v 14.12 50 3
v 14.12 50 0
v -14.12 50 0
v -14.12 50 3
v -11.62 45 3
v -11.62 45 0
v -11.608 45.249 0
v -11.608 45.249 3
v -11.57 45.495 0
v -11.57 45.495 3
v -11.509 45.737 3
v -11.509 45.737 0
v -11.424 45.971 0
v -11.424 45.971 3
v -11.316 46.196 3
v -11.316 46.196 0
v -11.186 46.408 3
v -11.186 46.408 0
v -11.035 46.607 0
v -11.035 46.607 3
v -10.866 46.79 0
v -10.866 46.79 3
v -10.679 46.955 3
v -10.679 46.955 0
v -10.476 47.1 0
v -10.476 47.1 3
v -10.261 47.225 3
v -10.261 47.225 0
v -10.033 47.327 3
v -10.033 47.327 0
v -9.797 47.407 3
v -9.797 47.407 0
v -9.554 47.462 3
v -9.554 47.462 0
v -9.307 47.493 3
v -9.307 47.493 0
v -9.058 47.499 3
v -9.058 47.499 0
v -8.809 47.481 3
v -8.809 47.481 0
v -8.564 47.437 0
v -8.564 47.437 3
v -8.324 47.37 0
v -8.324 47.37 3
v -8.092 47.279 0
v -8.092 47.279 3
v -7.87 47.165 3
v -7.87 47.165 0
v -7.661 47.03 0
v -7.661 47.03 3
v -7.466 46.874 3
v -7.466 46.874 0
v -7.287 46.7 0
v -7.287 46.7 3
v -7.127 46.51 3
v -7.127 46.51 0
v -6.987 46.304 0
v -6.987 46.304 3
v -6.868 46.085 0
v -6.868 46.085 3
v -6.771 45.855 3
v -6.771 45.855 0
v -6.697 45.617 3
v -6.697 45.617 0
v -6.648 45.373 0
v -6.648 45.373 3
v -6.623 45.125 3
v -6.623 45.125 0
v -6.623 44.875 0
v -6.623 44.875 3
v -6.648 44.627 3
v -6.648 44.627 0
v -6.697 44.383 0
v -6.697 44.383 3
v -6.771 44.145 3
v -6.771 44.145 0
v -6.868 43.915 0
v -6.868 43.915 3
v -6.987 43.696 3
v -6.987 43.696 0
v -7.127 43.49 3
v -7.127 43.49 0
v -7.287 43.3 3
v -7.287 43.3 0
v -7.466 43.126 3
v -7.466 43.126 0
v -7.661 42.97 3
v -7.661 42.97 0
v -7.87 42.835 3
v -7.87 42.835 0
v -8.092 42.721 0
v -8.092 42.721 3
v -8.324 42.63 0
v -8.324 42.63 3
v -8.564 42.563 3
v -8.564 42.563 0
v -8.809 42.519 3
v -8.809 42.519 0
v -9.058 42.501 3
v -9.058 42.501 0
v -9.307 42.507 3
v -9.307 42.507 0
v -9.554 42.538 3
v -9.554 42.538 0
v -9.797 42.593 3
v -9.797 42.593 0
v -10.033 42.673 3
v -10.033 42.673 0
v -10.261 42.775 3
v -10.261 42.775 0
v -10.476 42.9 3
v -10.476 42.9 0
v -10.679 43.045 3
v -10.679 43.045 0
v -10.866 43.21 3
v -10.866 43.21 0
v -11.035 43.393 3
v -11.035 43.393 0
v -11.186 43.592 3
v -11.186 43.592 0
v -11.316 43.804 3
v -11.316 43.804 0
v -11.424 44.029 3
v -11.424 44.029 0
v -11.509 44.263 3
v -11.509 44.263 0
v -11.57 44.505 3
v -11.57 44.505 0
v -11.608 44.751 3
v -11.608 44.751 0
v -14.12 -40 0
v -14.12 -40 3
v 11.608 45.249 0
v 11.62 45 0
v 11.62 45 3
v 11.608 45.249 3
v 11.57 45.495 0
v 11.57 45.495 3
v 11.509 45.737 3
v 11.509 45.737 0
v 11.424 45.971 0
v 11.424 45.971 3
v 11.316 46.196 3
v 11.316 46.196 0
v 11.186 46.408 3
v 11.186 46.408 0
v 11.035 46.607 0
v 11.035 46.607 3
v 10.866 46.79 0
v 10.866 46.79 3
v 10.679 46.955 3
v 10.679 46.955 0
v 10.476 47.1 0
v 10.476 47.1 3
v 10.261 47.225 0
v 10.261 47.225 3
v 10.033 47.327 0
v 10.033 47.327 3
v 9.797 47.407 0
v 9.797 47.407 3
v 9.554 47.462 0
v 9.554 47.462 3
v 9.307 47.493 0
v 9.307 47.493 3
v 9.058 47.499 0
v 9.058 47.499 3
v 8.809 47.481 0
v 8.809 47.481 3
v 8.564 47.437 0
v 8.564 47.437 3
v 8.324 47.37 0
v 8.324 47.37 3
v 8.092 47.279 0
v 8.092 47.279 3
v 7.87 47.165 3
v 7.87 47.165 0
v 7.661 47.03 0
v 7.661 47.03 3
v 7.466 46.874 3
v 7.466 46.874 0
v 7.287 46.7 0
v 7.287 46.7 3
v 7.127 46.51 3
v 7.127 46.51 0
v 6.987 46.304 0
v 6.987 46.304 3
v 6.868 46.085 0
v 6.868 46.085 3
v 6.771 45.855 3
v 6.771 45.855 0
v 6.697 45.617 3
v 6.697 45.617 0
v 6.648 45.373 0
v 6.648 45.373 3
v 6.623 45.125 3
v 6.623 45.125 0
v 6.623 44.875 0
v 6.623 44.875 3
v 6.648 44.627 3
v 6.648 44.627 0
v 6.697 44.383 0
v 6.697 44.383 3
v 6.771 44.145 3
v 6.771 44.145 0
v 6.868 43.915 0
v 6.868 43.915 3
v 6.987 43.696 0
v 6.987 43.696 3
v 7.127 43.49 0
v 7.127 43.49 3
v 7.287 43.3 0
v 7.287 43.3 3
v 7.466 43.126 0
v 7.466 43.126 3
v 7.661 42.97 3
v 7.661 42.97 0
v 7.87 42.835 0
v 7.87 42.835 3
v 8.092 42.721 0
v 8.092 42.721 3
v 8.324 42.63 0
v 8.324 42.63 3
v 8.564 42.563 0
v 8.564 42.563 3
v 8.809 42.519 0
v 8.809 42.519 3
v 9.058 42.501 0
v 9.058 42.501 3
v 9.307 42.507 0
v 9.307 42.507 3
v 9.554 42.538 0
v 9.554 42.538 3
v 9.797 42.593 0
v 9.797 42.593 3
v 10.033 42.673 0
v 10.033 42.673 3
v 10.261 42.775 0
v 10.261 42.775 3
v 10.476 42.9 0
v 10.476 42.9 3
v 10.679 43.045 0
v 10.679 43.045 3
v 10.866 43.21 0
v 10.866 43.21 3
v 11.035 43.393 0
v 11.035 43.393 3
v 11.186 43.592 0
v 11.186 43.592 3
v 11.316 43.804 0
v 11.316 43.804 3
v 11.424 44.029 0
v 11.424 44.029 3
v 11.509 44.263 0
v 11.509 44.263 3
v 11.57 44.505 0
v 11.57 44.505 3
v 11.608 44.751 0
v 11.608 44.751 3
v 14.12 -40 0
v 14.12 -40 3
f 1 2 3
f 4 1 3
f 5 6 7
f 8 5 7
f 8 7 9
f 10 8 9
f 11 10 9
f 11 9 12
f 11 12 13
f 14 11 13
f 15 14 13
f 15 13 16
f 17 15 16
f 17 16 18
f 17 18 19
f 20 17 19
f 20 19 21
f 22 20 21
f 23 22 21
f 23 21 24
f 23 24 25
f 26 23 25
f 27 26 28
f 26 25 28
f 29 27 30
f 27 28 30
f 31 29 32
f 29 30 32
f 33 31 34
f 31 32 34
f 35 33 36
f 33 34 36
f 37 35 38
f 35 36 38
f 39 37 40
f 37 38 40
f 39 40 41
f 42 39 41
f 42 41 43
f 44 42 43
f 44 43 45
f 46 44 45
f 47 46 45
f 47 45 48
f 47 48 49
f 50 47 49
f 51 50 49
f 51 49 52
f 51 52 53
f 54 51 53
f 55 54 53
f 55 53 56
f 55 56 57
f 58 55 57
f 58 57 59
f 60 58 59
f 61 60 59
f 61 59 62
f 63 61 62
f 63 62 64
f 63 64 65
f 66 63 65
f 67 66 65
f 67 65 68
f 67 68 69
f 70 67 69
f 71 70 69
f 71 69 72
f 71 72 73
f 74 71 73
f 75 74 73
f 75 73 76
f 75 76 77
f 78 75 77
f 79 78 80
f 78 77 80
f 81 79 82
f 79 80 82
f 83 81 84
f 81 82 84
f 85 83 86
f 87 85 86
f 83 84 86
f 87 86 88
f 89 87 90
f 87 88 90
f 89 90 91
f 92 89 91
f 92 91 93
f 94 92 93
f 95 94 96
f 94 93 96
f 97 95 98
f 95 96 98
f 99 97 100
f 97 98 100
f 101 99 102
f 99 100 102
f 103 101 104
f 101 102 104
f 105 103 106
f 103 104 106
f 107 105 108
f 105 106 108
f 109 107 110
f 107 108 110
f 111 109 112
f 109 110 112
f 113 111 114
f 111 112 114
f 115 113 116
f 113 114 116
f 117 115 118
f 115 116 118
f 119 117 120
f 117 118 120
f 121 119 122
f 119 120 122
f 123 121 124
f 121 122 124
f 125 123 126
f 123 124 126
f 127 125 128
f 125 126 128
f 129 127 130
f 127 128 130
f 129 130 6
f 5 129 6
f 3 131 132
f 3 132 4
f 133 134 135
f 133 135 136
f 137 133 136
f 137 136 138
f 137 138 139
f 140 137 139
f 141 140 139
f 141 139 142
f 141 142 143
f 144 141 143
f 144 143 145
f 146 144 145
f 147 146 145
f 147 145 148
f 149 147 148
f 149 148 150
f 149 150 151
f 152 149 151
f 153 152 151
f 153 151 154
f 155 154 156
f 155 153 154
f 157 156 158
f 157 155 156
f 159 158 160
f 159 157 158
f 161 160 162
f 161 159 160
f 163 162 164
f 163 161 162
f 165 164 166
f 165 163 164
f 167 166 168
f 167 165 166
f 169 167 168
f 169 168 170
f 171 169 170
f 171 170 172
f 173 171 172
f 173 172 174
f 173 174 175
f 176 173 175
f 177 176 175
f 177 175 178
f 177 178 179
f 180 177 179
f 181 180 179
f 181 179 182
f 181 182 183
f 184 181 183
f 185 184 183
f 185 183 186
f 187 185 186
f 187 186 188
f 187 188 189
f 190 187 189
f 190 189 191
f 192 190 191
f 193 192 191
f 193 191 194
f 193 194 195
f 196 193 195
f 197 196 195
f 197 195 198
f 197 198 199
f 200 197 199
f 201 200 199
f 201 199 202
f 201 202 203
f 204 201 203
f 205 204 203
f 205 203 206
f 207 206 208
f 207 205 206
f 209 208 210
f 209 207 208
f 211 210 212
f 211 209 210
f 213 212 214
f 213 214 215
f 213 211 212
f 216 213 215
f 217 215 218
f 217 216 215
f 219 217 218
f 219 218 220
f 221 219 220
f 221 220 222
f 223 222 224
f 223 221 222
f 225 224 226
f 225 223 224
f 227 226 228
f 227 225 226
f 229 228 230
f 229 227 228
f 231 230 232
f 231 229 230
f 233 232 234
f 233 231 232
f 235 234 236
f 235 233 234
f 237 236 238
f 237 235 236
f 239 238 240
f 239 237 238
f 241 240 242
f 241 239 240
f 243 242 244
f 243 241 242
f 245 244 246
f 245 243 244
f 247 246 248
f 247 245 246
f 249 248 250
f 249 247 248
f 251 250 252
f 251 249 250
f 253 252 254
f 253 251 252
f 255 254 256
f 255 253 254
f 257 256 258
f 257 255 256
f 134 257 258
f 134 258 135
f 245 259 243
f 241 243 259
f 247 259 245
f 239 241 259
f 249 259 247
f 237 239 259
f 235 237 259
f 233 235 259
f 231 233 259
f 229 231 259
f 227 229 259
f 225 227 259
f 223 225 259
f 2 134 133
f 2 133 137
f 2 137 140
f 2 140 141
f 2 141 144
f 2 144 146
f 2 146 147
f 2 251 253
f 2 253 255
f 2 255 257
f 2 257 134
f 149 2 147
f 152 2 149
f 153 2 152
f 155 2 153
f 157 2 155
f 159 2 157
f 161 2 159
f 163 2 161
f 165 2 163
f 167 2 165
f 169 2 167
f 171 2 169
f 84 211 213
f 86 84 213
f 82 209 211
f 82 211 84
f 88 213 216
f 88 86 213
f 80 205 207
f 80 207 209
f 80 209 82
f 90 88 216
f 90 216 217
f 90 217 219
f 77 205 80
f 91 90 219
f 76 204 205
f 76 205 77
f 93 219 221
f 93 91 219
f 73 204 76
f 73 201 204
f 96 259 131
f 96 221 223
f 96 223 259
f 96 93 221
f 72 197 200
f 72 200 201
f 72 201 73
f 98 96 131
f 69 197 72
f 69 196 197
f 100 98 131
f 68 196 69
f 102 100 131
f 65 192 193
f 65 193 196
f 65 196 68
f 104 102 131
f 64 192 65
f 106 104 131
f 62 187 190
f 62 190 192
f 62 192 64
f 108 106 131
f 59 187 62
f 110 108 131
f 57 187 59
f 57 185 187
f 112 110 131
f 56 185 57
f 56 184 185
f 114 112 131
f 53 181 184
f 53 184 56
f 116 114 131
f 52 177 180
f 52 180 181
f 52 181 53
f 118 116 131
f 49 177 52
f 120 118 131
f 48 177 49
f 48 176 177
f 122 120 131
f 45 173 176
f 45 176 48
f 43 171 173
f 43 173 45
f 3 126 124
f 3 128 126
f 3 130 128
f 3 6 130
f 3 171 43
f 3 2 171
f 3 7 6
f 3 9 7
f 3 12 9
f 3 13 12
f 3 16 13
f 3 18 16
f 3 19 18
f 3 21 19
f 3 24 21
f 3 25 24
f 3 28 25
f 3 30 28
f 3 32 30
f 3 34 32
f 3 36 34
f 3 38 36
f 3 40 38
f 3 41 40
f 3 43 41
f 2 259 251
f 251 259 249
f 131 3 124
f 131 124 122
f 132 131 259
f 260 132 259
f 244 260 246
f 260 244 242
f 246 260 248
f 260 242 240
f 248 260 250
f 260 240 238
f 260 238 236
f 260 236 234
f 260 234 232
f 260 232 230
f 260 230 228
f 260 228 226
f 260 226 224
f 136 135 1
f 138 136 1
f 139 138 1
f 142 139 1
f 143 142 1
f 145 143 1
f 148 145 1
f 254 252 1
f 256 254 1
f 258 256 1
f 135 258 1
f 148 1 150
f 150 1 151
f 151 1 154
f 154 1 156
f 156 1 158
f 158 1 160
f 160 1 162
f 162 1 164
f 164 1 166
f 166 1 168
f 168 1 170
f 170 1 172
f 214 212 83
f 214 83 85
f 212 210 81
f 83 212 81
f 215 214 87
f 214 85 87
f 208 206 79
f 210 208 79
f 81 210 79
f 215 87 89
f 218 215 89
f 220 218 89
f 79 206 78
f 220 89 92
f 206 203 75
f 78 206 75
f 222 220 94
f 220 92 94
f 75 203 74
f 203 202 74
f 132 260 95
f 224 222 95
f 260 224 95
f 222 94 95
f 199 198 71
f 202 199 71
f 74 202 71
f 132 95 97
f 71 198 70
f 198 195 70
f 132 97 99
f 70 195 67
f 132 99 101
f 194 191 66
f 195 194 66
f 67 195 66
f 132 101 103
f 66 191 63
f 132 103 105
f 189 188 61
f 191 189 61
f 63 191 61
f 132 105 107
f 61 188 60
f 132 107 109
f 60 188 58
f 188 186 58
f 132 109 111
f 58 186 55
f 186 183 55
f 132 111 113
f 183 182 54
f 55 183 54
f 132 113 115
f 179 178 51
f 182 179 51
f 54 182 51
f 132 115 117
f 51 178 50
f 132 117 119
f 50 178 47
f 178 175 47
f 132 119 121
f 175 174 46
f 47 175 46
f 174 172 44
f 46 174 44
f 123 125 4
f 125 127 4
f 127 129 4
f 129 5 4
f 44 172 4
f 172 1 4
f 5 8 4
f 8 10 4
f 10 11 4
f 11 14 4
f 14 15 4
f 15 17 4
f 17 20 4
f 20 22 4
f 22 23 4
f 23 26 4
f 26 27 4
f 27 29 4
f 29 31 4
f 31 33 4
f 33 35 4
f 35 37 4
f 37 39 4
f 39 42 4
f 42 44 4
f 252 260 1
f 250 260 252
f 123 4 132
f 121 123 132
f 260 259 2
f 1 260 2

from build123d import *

# Parameters (mm, degrees)
SKETCH1_W           = 28.24
SKETCH1_H           = 80
BOSS_EXTRUDE1_DEPTH = 3
SKETCH3_W           = 28.24
SKETCH3_H           = 10
BOSS_EXTRUDE3_DEPTH = 3
CUT_EXTRUDE1_REACH  = 54.042
SKETCH4_R           = 2.5


with BuildPart() as part:
    # Sketch1 → Boss-Extrude1 (new body)
    with BuildSketch(Plane.XY):
        Rectangle(SKETCH1_W, SKETCH1_H)
    extrude(amount=BOSS_EXTRUDE1_DEPTH)

    # Sketch3 → Boss-Extrude3 (add)
    with BuildSketch(Plane(origin=(0, 0, 0), x_dir=(-1, 0, 0), z_dir=(0, 0, -1))):
        with Locations((0, 45)):
            Rectangle(SKETCH3_W, SKETCH3_H)
    extrude(amount=-BOSS_EXTRUDE3_DEPTH)

    # Sketch4 → Cut-Extrude1 (cut, up to next)
    with BuildSketch(Plane(origin=(0, 0, 0), x_dir=(-1, 0, 0), z_dir=(0, 0, -1)), mode=Mode.PRIVATE) as cut_extrude1_sk1:
        with Locations((9.12, 45)):
            Circle(SKETCH4_R)
    cut_extrude1_tool1 = extrude(cut_extrude1_sk1.sketch, amount=-CUT_EXTRUDE1_REACH, mode=Mode.PRIVATE) & part.part
    cut_extrude1 = cut_extrude1_tool1.solids().sort_by_distance((-9.12, 45, 0))[0]
    add(cut_extrude1, mode=Mode.SUBTRACT)

    # Mirror1: Cut-Extrude1 across plane
    add(cut_extrude1.mirror(Plane(origin=(0, 0, 0), x_dir=(0, 0, 1), z_dir=(1, 0, 0))), mode=Mode.SUBTRACT)


solid = part.part
